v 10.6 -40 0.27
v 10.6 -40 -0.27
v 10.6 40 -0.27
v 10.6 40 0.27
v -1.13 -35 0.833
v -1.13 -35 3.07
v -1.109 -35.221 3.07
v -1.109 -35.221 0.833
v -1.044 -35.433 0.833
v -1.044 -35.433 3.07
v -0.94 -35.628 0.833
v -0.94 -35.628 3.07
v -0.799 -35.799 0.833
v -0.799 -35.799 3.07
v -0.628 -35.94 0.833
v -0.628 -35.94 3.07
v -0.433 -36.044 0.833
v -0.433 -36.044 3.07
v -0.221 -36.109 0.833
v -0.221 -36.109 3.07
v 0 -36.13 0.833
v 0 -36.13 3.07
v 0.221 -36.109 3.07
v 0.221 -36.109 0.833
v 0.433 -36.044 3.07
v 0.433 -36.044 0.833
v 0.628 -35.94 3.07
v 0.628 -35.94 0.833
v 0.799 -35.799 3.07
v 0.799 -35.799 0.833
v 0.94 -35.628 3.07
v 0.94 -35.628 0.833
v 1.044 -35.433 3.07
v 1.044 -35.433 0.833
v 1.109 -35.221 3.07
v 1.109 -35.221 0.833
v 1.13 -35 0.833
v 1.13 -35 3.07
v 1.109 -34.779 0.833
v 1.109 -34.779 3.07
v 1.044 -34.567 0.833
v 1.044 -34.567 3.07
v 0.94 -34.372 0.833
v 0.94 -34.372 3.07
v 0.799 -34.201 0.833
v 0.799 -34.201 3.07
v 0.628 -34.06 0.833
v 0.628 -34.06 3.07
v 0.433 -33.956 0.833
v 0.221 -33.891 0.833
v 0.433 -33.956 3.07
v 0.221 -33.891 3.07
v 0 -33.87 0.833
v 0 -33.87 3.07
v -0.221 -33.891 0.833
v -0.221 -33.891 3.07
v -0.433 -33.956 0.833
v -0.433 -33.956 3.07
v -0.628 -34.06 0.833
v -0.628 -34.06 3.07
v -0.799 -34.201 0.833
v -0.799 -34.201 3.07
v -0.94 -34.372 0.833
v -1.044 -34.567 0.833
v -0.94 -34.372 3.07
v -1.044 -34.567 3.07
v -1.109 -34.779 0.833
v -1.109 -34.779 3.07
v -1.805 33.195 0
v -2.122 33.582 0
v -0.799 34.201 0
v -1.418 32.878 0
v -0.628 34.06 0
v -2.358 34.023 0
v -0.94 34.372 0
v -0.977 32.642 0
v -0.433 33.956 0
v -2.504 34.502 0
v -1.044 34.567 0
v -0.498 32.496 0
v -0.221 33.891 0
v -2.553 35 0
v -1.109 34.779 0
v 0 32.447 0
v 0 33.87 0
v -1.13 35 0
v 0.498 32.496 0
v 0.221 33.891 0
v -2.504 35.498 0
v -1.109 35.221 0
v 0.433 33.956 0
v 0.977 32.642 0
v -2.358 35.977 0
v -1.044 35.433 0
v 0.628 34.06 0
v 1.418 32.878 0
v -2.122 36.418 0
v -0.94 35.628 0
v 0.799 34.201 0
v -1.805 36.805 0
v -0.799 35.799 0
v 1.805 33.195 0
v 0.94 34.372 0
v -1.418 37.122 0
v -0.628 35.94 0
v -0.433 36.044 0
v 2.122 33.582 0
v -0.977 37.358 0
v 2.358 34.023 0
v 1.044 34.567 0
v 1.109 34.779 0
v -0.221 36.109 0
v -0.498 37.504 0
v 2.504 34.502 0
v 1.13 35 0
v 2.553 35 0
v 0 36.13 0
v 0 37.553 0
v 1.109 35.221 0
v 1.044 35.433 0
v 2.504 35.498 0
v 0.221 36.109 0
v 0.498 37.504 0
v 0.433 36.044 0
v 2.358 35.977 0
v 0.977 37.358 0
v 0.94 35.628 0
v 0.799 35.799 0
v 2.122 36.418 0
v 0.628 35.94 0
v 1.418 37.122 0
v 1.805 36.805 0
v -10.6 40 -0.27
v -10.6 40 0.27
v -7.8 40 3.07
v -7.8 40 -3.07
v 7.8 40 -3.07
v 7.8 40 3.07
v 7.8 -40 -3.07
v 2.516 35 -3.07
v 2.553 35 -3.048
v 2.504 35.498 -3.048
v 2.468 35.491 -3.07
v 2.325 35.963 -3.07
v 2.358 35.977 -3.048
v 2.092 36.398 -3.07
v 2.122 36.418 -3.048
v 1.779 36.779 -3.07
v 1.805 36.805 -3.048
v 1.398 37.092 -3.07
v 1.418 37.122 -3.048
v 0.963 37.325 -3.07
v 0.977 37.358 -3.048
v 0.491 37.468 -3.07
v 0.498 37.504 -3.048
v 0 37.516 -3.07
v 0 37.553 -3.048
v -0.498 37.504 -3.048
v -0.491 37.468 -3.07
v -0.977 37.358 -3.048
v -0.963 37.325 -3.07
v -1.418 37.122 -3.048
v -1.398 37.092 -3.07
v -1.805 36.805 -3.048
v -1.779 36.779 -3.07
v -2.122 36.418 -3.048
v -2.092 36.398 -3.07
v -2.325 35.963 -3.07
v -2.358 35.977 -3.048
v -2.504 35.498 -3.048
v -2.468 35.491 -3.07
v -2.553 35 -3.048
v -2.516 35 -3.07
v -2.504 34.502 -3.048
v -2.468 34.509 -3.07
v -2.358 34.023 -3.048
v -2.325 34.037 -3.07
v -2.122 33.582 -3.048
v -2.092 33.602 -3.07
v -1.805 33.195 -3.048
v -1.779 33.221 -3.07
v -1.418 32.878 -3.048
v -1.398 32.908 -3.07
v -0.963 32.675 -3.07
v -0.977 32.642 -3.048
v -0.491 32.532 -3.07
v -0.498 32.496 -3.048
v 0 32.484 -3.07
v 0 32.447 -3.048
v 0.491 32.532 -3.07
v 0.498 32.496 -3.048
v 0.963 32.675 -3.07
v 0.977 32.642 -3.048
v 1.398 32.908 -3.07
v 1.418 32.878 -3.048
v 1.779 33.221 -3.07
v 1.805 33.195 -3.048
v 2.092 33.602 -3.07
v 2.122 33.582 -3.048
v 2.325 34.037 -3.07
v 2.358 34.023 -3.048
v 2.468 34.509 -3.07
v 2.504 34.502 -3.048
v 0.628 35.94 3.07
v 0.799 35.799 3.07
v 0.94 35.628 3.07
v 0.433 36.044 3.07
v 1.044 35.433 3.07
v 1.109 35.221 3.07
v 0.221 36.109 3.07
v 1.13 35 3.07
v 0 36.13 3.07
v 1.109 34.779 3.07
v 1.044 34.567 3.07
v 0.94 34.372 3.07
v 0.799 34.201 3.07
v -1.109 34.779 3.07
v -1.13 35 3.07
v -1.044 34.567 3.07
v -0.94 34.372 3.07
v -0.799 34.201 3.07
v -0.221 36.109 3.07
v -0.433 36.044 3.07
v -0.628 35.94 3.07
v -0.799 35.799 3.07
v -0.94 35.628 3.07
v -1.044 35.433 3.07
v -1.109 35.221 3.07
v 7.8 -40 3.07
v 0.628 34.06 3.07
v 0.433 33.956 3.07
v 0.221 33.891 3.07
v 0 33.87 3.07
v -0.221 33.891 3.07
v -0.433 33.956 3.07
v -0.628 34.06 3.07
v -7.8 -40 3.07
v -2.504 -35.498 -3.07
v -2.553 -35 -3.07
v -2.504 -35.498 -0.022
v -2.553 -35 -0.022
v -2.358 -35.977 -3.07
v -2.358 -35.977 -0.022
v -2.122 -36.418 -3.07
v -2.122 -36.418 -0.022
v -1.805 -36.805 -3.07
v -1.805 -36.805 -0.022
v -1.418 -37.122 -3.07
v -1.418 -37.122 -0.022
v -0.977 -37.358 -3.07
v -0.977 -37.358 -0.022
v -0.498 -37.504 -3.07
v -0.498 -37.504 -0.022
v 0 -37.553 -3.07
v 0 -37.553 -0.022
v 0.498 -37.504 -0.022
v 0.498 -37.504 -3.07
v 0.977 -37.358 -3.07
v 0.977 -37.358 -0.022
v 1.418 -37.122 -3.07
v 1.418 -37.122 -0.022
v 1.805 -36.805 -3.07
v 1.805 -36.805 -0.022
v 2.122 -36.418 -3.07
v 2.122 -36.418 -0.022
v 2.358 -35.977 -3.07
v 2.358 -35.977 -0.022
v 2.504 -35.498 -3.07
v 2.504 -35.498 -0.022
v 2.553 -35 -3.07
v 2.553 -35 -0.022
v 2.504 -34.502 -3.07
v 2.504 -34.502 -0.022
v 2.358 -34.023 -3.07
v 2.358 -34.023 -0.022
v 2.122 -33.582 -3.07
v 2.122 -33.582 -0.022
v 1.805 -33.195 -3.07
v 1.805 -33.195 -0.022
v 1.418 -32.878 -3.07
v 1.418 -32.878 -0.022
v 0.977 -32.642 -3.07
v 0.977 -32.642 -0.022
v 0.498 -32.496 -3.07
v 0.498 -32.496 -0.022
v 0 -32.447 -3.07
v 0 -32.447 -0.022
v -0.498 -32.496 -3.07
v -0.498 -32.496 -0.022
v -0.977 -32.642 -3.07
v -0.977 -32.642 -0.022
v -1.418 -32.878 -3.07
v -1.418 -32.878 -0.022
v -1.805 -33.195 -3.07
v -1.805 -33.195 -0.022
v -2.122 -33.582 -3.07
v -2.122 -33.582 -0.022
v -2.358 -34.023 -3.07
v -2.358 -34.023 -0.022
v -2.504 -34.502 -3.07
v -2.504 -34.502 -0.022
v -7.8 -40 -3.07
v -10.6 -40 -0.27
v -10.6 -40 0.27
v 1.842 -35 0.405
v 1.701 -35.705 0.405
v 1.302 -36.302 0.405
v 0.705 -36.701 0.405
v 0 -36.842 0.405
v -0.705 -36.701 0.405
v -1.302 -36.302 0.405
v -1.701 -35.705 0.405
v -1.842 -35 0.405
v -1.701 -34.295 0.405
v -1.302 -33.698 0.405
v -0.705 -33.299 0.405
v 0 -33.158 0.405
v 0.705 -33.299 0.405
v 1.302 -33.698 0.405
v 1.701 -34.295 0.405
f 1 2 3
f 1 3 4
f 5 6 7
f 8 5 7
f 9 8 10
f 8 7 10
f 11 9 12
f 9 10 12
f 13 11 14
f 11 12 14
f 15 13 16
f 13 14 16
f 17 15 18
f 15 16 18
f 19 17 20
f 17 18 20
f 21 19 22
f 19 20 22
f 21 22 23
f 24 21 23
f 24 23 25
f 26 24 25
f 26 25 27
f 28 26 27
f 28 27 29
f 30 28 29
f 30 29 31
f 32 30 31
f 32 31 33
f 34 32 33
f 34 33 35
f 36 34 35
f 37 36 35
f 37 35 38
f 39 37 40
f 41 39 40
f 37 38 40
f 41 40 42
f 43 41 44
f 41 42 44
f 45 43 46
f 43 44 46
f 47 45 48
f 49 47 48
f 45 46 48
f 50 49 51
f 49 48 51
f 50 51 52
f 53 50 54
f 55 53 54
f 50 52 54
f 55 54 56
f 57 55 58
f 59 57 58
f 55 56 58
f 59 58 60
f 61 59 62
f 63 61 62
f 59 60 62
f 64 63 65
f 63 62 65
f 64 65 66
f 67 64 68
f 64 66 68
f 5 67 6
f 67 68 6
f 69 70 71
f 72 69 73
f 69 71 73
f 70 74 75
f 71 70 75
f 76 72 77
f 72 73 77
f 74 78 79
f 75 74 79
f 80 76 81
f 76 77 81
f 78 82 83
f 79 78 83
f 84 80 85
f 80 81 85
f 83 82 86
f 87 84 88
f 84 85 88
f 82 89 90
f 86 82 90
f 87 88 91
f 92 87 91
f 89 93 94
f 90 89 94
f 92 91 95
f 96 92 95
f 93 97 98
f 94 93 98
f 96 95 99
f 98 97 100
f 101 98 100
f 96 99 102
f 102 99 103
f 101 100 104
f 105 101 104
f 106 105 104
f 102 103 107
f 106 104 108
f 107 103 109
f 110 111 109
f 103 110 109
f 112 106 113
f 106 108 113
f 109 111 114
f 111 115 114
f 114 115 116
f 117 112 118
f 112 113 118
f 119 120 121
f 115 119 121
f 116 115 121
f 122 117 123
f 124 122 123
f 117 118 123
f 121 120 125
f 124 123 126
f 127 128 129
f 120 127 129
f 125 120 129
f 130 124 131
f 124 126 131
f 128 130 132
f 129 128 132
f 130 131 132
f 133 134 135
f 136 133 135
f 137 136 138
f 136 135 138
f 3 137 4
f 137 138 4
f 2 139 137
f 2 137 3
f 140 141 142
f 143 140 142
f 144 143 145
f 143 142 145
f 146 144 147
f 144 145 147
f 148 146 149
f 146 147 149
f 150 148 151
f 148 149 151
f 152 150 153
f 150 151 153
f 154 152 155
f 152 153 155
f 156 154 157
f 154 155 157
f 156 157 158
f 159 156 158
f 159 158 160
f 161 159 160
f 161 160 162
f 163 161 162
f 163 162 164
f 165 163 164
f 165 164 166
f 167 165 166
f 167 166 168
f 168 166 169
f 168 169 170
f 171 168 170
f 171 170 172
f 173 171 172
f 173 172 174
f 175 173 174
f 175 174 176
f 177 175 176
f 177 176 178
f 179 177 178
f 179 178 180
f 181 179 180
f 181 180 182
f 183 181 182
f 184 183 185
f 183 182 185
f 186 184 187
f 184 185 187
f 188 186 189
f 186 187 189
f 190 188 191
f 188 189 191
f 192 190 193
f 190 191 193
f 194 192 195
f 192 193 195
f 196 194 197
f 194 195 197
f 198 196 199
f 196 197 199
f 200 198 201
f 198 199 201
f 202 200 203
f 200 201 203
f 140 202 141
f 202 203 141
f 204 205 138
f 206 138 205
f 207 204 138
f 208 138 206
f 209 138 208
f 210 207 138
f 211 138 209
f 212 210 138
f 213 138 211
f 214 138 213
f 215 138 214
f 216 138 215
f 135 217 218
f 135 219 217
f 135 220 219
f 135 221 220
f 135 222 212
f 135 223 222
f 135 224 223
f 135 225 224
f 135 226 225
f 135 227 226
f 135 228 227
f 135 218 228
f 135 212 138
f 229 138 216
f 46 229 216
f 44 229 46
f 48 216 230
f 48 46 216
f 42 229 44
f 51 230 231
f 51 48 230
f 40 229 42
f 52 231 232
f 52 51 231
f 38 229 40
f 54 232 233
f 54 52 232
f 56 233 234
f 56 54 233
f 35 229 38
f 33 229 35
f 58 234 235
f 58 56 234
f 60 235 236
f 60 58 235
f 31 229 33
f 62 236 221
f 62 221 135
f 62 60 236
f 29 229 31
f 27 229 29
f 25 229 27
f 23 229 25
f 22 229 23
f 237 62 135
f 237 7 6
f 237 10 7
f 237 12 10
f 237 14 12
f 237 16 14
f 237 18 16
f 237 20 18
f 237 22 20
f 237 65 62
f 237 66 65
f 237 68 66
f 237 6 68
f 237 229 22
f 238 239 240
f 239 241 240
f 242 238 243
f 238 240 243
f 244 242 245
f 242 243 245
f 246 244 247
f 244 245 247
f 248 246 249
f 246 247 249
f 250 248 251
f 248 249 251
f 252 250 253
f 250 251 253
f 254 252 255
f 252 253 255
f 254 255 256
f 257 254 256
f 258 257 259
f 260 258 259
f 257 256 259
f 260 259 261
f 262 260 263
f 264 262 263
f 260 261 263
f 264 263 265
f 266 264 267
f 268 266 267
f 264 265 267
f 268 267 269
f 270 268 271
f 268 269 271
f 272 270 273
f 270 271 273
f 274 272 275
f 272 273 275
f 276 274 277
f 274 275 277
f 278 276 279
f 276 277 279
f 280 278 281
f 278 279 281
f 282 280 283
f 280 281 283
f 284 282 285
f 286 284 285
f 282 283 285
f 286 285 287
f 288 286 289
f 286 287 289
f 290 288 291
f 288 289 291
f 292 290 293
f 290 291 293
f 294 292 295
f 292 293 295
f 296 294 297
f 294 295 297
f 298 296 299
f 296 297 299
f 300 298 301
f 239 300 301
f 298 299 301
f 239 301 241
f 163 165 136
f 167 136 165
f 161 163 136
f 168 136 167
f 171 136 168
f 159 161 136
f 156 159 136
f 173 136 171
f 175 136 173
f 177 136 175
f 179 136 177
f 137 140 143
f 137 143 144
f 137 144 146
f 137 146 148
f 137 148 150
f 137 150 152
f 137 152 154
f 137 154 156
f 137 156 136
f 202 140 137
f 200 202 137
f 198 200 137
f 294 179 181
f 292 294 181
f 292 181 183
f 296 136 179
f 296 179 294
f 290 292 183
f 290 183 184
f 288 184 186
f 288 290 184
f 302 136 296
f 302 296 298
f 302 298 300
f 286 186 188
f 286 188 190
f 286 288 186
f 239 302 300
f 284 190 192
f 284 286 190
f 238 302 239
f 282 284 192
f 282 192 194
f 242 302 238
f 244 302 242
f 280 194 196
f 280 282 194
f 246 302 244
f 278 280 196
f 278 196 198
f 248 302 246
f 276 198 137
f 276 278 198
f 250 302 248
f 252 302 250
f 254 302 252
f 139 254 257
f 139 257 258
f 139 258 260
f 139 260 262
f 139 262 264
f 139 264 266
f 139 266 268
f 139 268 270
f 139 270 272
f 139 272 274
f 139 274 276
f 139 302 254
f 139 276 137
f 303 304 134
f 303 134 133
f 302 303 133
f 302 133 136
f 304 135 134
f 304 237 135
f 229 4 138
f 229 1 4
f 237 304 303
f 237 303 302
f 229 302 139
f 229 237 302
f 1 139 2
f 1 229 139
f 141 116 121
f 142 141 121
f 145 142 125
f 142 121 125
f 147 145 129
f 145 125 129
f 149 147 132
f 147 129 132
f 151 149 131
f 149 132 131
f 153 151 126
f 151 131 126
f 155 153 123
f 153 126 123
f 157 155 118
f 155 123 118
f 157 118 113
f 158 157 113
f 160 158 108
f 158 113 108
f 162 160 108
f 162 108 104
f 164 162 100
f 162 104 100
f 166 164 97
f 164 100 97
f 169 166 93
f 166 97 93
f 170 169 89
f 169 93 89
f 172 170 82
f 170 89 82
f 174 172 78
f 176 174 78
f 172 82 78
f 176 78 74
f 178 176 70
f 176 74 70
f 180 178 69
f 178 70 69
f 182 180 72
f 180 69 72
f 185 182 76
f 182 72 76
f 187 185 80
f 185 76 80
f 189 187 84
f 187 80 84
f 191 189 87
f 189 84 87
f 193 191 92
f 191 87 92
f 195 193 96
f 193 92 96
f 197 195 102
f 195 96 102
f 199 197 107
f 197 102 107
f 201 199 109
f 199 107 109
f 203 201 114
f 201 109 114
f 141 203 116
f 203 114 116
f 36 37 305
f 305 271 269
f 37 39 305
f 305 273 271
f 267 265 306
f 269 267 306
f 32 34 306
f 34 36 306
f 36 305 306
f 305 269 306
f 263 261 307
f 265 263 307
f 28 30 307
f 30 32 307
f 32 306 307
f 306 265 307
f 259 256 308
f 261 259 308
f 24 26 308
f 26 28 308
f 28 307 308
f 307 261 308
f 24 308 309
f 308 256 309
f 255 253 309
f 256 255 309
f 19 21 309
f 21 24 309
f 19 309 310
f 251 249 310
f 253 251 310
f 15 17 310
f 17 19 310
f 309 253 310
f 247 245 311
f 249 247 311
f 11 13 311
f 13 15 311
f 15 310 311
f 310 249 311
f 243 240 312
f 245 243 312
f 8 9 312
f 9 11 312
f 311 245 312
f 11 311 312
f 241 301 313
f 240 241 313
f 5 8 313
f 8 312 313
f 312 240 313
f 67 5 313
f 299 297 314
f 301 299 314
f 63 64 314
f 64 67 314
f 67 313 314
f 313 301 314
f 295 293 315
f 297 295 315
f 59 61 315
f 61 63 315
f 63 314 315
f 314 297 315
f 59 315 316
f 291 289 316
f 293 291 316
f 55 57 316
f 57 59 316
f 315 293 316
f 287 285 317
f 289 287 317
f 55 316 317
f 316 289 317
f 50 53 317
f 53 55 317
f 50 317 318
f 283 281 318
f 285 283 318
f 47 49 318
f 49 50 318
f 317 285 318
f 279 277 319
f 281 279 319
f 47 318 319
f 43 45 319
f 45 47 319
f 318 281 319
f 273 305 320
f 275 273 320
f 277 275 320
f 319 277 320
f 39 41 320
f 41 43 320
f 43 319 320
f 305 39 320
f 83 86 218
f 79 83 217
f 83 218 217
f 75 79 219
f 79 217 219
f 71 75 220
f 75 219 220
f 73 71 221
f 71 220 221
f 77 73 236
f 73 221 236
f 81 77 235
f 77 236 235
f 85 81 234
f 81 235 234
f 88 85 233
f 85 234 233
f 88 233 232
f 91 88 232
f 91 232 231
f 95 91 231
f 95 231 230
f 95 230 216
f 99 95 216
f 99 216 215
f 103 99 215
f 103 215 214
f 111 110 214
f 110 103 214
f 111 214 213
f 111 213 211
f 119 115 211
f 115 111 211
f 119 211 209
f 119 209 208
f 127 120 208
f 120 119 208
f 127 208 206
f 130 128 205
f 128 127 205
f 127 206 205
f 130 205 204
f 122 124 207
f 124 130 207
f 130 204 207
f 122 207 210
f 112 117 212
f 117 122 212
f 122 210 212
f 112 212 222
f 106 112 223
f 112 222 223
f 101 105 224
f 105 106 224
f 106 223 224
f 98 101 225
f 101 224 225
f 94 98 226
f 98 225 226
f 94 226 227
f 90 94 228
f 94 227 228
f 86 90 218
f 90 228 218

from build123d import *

# Parameters (mm, degrees)
F1_DEPTH  = 40
F5_D      = 2.2606
F5_DEPTH  = 3.071
F6_D      = 2.2606
F7_D      = 2.2606
F7_DEPTH  = 3.071
F8_D      = 2.2606
F11_D     = 5.1054
F11_DEPTH = 3.048
F11_TIP   = 1.5338169022
F12_D     = 5.1054
F12_DEPTH = 3.048
F12_TIP   = 1.5338169022


with BuildPart() as f1:
    # F0 (on Front) → F1 (new body, symmetric)
    with BuildSketch(Plane.XZ):
        Polygon((-7.8, 3.07), (-10.6, 0.27), (-10.6, -0.27), (-7.8, -3.07), (7.8, -3.07), (10.6, -0.27), (10.6, 0.27), (7.8, 3.07), align=None)
    extrude(amount=F1_DEPTH, both=True)

    # F5 (through all, one way)
    with BuildSketch(Plane.XY):
        with Locations((0, -35)):
            Circle(F5_D / 2)
    extrude(amount=-F5_DEPTH, mode=Mode.SUBTRACT)

    # F6 (through all)
    with Locations(Plane(origin=(0, 0, 0), x_dir=(1, 0, 0), z_dir=(0, 0, -1))):
        with Locations((0, 35)):
            Hole(F6_D / 2)

    # F7 (through all, one way)
    with BuildSketch(Plane.XY):
        with Locations((0, 35)):
            Circle(F7_D / 2)
    extrude(amount=-F7_DEPTH, mode=Mode.SUBTRACT)

    # F8 (through all)
    with Locations(Plane(origin=(0, 0, 0), x_dir=(1, 0, 0), z_dir=(0, 0, -1))):
        with Locations((0, -35)):
            Hole(F8_D / 2)

    # F11
    with Locations(Plane(origin=(0, 0, -3.07), x_dir=(1, 0, 0), z_dir=(0, 0, -1))):
        with Locations((0, 35)):
            Hole(F11_D / 2, depth=F11_DEPTH)
            with Locations((0, 0, -(F11_DEPTH + F11_TIP / 2))):  # 118° drill point
                Cone(0, F11_D / 2, F11_TIP, mode=Mode.SUBTRACT)

    # F12 (one way)
    with BuildSketch(Plane.XY):
        with Locations((0, 35)):
            Circle(F12_D / 2)
    extrude(amount=-F12_DEPTH, mode=Mode.SUBTRACT)
    with Locations(Plane.XY):
        with Locations((0, 35)):
            with Locations((0, 0, -(F12_DEPTH + F12_TIP / 2))):  # 118° drill point
                Cone(0, F12_D / 2, F12_TIP, mode=Mode.SUBTRACT)


solid = f1.part
